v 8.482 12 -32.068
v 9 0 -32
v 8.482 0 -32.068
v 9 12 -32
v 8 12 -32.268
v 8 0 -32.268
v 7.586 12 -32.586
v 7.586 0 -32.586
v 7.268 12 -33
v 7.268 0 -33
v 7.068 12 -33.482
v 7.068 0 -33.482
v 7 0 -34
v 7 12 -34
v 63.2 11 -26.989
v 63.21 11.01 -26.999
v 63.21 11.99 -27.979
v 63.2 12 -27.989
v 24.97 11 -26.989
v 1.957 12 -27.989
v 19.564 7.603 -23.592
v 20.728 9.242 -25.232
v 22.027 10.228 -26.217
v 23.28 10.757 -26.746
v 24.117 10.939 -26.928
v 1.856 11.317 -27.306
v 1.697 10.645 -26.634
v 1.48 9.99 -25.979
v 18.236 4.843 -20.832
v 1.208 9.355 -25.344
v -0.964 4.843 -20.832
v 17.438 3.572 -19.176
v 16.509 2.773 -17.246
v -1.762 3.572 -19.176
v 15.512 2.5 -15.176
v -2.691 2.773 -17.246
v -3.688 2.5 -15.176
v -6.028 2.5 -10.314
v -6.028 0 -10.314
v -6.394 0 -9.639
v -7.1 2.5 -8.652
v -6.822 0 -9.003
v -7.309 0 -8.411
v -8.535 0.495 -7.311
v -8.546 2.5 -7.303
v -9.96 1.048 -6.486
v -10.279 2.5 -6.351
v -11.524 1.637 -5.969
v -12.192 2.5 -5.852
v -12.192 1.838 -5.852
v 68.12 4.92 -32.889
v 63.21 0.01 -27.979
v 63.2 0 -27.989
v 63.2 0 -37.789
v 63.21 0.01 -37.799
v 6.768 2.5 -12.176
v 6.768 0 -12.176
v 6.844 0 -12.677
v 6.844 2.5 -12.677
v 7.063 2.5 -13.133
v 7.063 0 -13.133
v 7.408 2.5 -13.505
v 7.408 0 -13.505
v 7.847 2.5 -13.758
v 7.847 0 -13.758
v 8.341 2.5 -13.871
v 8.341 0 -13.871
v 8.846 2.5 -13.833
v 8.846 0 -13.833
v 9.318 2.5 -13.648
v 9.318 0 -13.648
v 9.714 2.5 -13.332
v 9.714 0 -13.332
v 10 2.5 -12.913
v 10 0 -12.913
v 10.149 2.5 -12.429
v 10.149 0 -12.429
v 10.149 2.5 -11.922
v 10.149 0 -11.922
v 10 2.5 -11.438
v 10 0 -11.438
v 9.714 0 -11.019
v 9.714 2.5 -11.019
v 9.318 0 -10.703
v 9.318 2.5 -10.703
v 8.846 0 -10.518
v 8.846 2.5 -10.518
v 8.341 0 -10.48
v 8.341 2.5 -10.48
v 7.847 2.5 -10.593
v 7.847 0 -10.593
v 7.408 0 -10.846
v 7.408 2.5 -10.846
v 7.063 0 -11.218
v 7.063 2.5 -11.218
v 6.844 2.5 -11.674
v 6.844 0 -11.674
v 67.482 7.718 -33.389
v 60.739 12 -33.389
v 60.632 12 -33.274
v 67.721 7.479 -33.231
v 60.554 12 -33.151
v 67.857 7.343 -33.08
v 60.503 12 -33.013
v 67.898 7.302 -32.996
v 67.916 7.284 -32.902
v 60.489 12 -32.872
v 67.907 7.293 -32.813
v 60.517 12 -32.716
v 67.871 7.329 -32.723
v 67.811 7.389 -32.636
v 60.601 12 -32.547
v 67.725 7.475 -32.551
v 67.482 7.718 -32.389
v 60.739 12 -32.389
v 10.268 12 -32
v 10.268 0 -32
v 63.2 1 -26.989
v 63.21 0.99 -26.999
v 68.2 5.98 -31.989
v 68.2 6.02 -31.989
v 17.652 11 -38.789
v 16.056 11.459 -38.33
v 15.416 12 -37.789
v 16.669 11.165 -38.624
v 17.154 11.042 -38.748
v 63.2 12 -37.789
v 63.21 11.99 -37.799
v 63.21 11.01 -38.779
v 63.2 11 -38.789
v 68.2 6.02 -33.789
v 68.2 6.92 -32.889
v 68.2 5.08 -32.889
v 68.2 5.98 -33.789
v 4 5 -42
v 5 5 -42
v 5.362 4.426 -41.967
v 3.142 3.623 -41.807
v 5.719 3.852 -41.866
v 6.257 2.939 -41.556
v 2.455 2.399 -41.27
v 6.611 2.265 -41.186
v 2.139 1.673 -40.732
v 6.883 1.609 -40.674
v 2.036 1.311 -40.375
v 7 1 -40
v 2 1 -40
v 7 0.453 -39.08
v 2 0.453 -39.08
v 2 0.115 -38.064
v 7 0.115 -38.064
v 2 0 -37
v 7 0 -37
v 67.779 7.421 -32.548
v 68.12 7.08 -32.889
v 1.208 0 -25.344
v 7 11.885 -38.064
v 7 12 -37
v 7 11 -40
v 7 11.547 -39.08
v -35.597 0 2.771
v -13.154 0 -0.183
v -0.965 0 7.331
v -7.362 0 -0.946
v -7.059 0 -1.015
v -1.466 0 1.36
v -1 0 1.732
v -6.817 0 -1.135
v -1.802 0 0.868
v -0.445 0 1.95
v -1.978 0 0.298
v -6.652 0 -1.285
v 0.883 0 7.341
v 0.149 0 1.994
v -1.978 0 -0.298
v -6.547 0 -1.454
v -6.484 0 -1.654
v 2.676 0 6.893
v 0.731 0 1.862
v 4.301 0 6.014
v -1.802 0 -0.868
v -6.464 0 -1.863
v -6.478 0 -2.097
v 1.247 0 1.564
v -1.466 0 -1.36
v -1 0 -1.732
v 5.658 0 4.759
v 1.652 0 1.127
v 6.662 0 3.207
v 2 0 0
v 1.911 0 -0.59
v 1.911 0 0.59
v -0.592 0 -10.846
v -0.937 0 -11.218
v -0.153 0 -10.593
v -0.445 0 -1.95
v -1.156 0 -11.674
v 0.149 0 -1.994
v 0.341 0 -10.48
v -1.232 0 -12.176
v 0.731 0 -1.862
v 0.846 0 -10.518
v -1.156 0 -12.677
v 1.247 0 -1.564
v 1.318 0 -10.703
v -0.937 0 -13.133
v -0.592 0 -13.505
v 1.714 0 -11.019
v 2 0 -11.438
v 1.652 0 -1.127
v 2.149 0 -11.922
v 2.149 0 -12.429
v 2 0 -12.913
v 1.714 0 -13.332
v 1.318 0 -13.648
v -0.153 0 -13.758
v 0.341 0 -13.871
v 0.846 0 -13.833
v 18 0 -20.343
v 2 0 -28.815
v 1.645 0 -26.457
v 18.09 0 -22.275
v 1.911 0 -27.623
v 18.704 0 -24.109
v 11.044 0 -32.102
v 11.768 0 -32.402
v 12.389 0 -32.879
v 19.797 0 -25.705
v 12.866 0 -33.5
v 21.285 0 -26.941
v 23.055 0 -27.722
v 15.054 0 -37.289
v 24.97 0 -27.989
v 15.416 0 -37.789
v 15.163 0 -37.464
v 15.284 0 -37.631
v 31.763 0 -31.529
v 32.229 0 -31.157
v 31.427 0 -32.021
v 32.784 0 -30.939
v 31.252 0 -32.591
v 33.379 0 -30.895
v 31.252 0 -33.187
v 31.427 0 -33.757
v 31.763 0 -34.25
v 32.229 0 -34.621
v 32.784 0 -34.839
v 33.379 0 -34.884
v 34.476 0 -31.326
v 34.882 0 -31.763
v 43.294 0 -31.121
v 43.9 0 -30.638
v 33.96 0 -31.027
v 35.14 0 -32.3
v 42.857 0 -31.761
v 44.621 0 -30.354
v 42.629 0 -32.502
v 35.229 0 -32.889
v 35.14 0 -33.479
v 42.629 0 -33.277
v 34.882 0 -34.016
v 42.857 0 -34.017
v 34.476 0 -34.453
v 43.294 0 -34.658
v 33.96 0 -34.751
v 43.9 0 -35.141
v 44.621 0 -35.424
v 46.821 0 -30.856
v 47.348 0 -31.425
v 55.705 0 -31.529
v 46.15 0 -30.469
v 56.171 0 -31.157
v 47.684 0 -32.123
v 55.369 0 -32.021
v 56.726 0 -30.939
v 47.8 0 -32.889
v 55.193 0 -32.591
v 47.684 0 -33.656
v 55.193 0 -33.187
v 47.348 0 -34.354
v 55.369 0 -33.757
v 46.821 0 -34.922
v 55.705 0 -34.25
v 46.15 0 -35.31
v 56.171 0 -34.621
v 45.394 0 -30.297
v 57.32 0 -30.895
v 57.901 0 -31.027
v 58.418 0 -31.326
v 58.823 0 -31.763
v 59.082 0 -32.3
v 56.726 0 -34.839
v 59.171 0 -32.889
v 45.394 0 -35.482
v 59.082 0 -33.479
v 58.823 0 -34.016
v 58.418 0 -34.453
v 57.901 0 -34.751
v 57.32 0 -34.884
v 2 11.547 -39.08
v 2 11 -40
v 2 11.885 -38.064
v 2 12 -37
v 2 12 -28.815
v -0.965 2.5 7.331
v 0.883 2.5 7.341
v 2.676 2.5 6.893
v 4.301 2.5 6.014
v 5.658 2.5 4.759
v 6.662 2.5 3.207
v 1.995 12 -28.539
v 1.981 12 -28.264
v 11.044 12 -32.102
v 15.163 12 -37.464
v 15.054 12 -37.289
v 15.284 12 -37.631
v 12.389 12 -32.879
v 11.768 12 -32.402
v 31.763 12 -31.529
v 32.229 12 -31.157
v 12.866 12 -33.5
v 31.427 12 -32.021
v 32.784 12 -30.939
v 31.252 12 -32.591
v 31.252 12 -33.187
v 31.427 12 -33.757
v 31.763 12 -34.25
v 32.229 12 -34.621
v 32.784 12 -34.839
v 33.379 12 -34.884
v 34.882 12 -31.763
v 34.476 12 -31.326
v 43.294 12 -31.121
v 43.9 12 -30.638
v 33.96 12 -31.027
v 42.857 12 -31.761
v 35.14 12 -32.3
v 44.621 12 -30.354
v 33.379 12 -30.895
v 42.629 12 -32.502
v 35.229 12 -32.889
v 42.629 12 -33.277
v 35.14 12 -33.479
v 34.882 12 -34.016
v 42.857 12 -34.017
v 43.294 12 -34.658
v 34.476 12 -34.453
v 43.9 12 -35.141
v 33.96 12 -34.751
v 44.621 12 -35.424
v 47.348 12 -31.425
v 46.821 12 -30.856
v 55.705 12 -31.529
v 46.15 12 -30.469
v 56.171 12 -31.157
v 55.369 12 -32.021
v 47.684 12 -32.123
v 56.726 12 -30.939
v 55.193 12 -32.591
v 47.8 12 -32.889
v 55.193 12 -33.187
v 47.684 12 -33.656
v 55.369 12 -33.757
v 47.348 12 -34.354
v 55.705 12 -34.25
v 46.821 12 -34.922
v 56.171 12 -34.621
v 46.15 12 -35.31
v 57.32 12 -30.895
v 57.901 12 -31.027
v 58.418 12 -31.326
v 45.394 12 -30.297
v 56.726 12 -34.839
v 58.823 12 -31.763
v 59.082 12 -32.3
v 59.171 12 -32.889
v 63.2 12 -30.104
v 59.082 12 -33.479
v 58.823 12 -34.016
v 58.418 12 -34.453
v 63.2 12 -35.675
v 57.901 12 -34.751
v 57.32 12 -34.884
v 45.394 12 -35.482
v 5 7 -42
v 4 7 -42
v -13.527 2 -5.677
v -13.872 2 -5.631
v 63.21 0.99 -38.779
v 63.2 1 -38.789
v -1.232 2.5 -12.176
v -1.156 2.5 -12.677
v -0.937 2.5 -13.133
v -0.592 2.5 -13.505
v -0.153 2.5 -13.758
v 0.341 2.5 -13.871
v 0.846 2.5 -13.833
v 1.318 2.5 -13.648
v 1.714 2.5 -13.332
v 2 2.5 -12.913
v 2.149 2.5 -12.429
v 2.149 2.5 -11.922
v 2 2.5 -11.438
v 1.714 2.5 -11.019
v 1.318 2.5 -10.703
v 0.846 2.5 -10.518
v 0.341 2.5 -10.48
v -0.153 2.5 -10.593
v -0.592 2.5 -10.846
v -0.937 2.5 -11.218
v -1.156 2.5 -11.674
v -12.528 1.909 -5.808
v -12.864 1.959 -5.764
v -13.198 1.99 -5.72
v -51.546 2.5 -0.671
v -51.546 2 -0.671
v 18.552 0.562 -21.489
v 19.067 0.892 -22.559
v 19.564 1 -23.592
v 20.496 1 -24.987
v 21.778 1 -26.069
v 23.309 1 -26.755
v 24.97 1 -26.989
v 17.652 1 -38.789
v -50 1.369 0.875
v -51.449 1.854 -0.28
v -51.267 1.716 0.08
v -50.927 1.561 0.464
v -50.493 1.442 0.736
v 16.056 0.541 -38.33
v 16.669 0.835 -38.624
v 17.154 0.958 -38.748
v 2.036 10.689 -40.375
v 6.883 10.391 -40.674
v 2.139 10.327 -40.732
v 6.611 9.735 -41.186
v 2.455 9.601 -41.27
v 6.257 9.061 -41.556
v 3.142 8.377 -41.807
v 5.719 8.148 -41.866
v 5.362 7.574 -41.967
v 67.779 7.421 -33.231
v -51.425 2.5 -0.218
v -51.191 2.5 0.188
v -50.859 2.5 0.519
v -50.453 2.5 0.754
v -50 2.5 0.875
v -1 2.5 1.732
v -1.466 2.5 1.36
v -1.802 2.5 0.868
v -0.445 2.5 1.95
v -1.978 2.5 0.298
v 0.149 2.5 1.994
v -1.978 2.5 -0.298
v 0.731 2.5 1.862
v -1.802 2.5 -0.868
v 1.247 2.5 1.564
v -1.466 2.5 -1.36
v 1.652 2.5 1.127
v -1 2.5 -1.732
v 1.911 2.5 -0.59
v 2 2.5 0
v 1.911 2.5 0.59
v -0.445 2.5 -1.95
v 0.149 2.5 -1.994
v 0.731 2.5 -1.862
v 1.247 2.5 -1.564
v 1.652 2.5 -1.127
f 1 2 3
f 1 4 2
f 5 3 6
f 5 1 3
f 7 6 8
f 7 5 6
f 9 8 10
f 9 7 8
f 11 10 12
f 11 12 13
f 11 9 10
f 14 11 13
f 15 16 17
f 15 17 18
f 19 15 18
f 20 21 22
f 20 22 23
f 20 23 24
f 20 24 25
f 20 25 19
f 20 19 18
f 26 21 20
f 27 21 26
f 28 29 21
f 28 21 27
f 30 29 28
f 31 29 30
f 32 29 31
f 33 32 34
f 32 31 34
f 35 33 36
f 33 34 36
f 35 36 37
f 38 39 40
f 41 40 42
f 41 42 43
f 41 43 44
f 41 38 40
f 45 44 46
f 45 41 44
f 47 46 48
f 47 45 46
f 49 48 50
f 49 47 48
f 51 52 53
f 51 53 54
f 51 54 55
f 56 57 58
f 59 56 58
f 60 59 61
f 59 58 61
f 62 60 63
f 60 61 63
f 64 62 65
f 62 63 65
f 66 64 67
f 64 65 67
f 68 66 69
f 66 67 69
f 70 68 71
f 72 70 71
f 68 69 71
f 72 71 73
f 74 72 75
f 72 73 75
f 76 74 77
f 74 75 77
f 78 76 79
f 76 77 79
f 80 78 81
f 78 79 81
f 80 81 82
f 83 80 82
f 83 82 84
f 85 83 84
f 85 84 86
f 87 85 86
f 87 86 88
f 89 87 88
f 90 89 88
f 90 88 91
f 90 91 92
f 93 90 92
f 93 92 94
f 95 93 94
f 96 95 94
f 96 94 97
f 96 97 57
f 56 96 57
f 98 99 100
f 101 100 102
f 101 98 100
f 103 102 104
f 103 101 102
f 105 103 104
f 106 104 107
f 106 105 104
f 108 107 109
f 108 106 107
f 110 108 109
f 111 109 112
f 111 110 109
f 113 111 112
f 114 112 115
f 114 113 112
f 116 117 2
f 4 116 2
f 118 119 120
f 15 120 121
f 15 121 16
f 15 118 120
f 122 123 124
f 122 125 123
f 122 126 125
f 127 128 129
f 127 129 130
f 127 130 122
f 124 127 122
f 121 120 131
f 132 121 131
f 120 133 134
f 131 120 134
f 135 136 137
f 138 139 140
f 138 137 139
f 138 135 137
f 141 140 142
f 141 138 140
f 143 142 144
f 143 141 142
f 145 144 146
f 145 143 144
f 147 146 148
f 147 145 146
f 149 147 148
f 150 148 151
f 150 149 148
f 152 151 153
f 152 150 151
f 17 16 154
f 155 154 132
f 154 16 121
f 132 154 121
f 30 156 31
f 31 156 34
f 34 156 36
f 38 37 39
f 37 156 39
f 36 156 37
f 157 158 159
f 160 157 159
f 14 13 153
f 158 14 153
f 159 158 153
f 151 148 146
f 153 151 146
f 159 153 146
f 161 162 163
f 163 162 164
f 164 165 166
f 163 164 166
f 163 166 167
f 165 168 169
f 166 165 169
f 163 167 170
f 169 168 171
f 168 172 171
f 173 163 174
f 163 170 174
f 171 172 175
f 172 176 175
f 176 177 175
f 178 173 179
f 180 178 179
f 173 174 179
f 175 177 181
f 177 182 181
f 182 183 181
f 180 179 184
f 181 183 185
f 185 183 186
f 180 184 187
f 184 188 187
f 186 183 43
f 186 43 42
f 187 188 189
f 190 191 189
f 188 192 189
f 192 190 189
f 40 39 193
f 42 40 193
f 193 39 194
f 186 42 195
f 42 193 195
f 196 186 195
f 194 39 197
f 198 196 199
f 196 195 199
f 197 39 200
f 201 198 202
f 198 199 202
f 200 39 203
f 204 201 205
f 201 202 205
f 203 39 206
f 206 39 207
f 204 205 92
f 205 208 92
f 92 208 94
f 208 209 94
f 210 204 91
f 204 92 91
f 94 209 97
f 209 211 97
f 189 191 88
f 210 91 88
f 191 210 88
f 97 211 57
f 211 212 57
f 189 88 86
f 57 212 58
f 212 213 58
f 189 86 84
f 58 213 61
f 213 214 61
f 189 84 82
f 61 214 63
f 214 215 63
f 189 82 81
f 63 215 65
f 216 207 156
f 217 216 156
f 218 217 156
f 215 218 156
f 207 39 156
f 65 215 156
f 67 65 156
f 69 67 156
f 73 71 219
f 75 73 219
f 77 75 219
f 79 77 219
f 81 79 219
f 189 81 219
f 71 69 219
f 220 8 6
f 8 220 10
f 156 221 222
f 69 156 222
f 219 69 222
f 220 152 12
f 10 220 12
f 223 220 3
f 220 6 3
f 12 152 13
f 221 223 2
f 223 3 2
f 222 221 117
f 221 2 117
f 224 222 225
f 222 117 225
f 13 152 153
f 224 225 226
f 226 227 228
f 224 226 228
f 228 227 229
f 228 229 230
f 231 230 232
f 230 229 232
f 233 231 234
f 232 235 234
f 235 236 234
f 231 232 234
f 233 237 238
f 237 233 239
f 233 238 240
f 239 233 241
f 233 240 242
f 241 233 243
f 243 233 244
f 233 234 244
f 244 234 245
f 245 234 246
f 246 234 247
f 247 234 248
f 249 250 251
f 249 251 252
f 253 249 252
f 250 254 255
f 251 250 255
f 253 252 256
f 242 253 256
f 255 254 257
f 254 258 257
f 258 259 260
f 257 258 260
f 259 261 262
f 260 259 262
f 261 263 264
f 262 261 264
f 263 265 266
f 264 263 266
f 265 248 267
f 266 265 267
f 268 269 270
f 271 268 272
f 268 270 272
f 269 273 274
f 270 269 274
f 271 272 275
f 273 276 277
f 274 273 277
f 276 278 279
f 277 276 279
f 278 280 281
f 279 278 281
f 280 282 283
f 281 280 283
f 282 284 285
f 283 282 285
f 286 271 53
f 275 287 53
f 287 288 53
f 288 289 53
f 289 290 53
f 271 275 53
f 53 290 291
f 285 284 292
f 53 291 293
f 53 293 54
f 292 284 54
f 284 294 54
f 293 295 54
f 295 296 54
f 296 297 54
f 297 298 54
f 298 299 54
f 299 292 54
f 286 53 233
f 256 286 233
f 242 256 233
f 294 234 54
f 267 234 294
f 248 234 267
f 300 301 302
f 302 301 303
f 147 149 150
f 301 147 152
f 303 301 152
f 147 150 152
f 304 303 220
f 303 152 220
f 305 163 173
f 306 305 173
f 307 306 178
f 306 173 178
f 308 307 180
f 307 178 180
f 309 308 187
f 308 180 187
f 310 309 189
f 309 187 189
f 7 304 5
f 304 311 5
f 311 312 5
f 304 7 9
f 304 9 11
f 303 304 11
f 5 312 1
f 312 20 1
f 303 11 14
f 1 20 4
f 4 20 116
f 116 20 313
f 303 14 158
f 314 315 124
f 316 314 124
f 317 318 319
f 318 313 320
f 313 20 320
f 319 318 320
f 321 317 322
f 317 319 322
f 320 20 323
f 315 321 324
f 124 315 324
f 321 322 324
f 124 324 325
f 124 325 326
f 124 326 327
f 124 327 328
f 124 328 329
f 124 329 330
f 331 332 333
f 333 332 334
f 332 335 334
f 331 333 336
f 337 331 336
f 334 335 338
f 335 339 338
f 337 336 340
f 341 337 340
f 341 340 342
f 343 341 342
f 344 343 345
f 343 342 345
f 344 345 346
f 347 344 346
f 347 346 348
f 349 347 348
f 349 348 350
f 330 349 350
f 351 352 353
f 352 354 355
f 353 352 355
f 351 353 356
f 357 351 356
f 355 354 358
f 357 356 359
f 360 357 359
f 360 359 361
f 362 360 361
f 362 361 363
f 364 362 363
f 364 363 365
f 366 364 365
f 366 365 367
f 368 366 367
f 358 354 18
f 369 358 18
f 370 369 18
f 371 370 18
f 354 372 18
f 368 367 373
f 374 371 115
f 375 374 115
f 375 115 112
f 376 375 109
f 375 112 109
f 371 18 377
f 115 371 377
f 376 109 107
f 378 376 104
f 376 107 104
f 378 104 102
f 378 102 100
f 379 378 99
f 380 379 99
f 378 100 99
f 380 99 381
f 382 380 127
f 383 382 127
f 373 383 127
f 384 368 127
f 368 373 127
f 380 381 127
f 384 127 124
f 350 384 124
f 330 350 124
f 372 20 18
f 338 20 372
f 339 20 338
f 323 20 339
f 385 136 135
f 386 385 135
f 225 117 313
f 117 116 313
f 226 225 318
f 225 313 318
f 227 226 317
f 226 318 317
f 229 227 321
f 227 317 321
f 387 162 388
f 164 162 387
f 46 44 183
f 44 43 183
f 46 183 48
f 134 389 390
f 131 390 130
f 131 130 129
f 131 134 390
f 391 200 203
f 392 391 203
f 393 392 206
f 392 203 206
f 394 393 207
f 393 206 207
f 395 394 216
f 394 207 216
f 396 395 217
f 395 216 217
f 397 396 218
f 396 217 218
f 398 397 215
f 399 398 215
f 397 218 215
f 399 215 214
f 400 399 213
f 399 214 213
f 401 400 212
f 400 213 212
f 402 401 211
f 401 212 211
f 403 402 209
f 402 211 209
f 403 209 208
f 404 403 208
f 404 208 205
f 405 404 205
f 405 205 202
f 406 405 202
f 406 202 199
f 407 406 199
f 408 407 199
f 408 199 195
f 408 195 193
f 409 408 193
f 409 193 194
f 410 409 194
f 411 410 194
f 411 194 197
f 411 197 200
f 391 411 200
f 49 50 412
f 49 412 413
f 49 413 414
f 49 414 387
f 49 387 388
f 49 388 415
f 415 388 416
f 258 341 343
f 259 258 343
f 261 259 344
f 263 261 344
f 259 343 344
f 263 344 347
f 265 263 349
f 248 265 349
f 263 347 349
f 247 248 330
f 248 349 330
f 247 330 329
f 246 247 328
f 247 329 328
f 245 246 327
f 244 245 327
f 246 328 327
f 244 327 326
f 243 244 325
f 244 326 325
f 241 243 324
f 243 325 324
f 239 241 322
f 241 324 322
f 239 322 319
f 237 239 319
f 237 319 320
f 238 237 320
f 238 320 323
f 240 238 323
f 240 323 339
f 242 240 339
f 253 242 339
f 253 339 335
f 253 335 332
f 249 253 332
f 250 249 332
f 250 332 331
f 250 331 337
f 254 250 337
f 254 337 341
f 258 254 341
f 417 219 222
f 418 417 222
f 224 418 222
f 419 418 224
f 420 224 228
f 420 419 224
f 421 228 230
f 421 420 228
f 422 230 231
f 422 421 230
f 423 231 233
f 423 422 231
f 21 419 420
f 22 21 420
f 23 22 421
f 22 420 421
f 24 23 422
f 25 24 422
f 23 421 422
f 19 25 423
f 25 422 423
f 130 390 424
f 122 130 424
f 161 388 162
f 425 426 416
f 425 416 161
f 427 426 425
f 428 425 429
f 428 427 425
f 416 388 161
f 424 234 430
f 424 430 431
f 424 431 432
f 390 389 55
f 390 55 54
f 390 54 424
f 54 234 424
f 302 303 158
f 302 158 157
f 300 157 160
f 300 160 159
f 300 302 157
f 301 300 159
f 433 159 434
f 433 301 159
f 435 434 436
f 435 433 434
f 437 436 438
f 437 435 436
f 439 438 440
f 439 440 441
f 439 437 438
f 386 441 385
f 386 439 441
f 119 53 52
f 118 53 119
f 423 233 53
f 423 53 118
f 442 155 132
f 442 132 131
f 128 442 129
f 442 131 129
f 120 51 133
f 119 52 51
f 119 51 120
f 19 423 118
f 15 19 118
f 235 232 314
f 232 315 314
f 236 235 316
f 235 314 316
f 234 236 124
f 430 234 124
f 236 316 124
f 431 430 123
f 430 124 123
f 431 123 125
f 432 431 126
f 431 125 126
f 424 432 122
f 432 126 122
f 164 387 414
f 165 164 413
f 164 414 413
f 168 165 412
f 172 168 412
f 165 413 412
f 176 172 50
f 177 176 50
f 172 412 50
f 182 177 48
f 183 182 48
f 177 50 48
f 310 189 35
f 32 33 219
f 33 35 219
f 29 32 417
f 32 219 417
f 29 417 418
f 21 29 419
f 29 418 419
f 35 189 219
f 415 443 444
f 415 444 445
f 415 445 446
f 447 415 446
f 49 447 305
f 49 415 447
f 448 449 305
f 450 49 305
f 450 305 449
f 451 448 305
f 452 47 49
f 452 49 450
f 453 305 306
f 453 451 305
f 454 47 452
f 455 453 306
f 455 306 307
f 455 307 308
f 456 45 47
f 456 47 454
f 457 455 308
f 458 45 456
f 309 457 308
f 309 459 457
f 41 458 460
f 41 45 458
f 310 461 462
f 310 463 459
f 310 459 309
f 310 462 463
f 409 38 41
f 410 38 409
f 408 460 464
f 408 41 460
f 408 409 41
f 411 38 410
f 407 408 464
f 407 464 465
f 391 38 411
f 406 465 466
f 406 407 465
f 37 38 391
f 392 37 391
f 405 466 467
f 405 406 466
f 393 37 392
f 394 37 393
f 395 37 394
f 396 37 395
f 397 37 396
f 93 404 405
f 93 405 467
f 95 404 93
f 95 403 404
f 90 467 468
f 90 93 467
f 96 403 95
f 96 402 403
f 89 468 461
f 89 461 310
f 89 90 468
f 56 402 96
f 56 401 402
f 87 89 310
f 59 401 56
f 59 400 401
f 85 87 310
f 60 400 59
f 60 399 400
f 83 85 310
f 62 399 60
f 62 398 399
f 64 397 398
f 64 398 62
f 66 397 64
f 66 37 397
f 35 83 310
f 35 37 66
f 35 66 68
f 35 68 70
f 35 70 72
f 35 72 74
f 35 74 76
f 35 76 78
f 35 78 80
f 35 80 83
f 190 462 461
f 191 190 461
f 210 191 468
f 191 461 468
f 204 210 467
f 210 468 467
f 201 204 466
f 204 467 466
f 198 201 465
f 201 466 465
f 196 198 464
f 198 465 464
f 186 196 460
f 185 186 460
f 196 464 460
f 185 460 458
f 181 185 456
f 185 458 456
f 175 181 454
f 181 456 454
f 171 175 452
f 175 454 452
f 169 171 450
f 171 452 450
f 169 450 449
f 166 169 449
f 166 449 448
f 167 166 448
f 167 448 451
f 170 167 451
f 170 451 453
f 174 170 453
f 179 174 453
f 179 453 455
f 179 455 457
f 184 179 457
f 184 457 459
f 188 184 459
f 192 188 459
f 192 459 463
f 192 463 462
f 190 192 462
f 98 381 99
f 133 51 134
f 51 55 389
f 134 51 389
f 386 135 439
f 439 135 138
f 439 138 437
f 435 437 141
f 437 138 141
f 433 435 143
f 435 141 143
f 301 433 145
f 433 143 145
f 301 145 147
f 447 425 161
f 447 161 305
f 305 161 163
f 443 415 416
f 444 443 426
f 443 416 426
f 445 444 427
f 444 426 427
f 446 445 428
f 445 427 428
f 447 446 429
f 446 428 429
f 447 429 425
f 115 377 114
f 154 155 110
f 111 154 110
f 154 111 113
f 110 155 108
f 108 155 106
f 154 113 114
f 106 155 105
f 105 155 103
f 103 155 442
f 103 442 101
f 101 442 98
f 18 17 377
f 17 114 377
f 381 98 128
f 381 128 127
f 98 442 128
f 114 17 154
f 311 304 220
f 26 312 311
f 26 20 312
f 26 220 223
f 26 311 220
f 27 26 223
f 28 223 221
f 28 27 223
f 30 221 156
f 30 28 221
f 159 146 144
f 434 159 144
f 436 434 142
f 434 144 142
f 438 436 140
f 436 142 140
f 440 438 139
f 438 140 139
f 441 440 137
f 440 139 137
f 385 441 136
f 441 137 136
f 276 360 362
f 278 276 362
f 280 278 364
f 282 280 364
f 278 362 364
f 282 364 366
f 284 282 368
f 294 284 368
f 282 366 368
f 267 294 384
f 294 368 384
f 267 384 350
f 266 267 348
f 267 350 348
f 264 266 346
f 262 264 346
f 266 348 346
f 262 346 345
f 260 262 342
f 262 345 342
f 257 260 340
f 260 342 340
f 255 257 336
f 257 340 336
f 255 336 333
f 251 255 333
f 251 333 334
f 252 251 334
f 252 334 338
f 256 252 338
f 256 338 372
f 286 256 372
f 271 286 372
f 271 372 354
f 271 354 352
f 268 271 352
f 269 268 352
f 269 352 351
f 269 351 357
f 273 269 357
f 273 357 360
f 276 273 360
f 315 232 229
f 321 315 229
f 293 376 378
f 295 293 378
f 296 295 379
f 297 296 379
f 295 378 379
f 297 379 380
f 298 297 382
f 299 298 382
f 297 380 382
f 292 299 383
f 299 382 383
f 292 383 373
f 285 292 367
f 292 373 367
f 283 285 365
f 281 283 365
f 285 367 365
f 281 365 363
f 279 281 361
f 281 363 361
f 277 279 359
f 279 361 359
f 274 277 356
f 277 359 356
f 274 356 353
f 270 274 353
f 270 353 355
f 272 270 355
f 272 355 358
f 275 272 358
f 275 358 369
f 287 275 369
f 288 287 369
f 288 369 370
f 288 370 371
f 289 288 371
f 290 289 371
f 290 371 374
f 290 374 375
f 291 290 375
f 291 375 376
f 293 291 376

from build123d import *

# Parameters (mm, degrees)
BOSS_EXTRUDE1_DEPTH          = 2.5
BOSS_EXTRUDE2_DEPTH          = 12
F_4_0_4_DIAMETER_HOLE1_D     = 4
F_4_0_4_DIAMETER_HOLE2_D     = 4
F_5_2_5_2_DIAMETER_HOLE1_D   = 5.2
CHAMFER5_SIZE                = 8.5
FILLET13_R                   = 6
CHAMFER1_SIZE                = 5
CHAMFER2_SIZE                = 1
CHAMFER4_SIZE                = 0.8
CUT_REVOLVE1_ANGLE           = 60
CUT_REVOLVE1_OTHER_WAY_ANGLE = 60
FILLET4_R                    = 1
FILLET5_R                    = 8
FILLET6_R                    = 3
FILLET7_R                    = 2
FILLET11_R                   = 5
FILLET12_R                   = 2
CUT_EXTRUDE2_DEPTH           = 38
CHAMFER8_SIZE                = 6.868693549
CHAMFER8_SIZE_2              = 2.5
FILLET14_R                   = 3
M3_CLEARANCE_HOLE1_D         = 3.4


with BuildPart() as part:
    # Sketch1 → Boss-Extrude1 (new body)
    with BuildSketch(Plane(origin=(0, 0, 0), x_dir=(1, 0, 0), z_dir=(0, 1, 0))):
        with BuildLine():
            Line((-7.904447763, 6.416984589), (-51.546411114, 0.671411114))
            ThreePointArc((-51.546411114, 0.671411114), (-51.035673477, -0.364262362), (-50, -0.875))
            Line((-50, -0.875), (-0.965087675, -7.330568677))
            ThreePointArc((-0.965087675, -7.330568677), (3.516208172, -6.504222585), (6.661937904, -3.207368814))
            Line((6.661937904, -3.207368814), (21.2, 26.989241728))
            Line((21.2, 26.989241728), (2, 26.989241728))
            Line((2, 26.989241728), (-7.904447763, 6.416984589))
        make_face()
    extrude(amount=BOSS_EXTRUDE1_DEPTH)

    # Sketch1<6> → Boss-Extrude2 (add)
    with BuildSketch(Plane(origin=(0, 0, 0), x_dir=(1, 0, 0), z_dir=(0, 1, 0))):
        Polygon((2, 42), (2, 26.989241728), (68.2, 26.989241728), (68.2, 38.789241728), (15.919770539, 38.789241728), (12, 32), (7, 32), (7, 42), align=None)
    extrude(amount=BOSS_EXTRUDE2_DEPTH)

    # Ø4.0 (4) Diameter Hole1 (through all)
    with Locations(Plane(origin=(0, 0, 0), x_dir=(-1, 0, 0), z_dir=(0, -1, 0))):
        with Locations((-57.170705016, 32.889241728), (-33.229294984, 32.889241728)):
            Hole(F_4_0_4_DIAMETER_HOLE1_D / 2)

    # Ø4.0 (4) Diameter Hole2 (through all)
    with Locations(Plane(origin=(0, 0, 0), x_dir=(-1, 0, 0), z_dir=(0, -1, 0))):
        with Locations((0, 0)):
            Hole(F_4_0_4_DIAMETER_HOLE2_D / 2)

    # Ø5.2 (5.2) Diameter Hole1 (through all)
    with Locations(Plane(origin=(0, 0, 0), x_dir=(-1, 0, 0), z_dir=(0, -1, 0))):
        with Locations((-45.2, 32.889241728)):
            Hole(F_5_2_5_2_DIAMETER_HOLE1_D / 2)

    # Chamfer5
    chamfer5_edges = [part.edges().sort_by_distance(p)[0] for p in [
        (11.6, 2.5, -26.989241728),
    ]]
    chamfer(chamfer5_edges, length=CHAMFER5_SIZE)

    # Fillet13
    fillet13_edges = [part.edges().sort_by_distance(p)[0] for p in [
        (21.2, 5.5, -26.989241728),
    ]]
    fillet(fillet13_edges, radius=FILLET13_R)

    # Chamfer1
    chamfer1_edges = [part.edges().sort_by_distance(p)[0] for p in [
        (68.2, 0, -32.889241728),
        (68.2, 6, -26.989241728),
        (68.2, 6, -38.789241728),
        (68.2, 12, -32.889241728),
    ]]
    chamfer(chamfer1_edges, length=CHAMFER1_SIZE)

    # Chamfer2
    # the kernel refuses this chamfer: 1 mm, written as the material it takes off along each edge
    with BuildSketch(Plane(origin=(24.970484005, 0, -26.989241728), x_dir=(0, 0, -1), z_dir=(1, 0, 0))) as chamfer2_piece_1:
        Polygon((CHAMFER2_SIZE, 0), (0, CHAMFER2_SIZE), (0, 0), align=None)
    extrude(amount=40.801198983, mode=Mode.SUBTRACT)
    with BuildSketch(Plane(origin=(-0.571682988, 12, -26.989241728), x_dir=(0, -1, 0), z_dir=(1, 0, 0))) as chamfer2_piece_2:
        Polygon((CHAMFER2_SIZE, 0), (0, CHAMFER2_SIZE), (0, 0), align=None)
    extrude(amount=66.343365976, mode=Mode.SUBTRACT)
    with BuildSketch(Plane(origin=(65.771682988, 12, -38.789241728), x_dir=(0, -1, 0), z_dir=(-1, 0, 0)), Plane(origin=(65.771682988, 0, -38.789241728), x_dir=(0, 0, 1), z_dir=(-1, 0, 0))) as chamfer2_piece_3:
        Polygon((CHAMFER2_SIZE, 0), (0, CHAMFER2_SIZE), (0, 0), align=None)
    extrude(amount=52.423595437, mode=Mode.SUBTRACT)
    with BuildSketch(Plane(origin=(24.970484005, 0, -20.989241728), x_dir=(-0.9610284466527214, -1.1097335043339142e-15, 0.27644949760174536), z_dir=(0.27644949760174536, 0, 0.9610284466527214))) as chamfer2_piece_4:
        Polygon((6 + CHAMFER2_SIZE, 0), (6, -CHAMFER2_SIZE), (6, 0), align=None)
    revolve(axis=Axis((24.970484005, 0, -20.989241728), (0, -1, 0)), revolution_arc=106.048413393, mode=Mode.SUBTRACT)

    # Chamfer4
    # the kernel refuses this chamfer: 0.8 mm, written as the material it takes off along each edge
    with BuildSketch(Plane(origin=(62.505076275, -0.694923725, -39.484165453), x_dir=(-0.40824829046386635, -0.4082482904638597, 0.816496580927726), z_dir=(0.5773502691896258, 0.5773502691896258, 0.5773502691896258)), Plane(origin=(62.505076275, 12.694923725, -39.484165453), x_dir=(-0.40824829046386746, -0.816496580927726, -0.4082482904638586), z_dir=(0.5773502691896258, -0.5773502691896258, 0.5773502691896258)), Plane(origin=(69.394923725, 5.805076275, -33.184165453), x_dir=(-0.408248290463863, -0.816496580927726, 0.408248290463863), z_dir=(-0.5773502691896258, 0.5773502691896258, 0.5773502691896258))) as chamfer4_piece_1:
        Polygon((CHAMFER4_SIZE, 0), (-CHAMFER4_SIZE * 0.5, -CHAMFER4_SIZE * 0.866025403784), (0, 0), align=None)
    extrude(amount=11.933565841, mode=Mode.SUBTRACT)
    with BuildSketch(Plane(origin=(62.505076275, -0.694923725, -26.294318002), x_dir=(-0.4082482904638641, -0.4082482904638619, -0.816496580927726), z_dir=(0.5773502691896258, 0.5773502691896258, -0.5773502691896258))) as chamfer4_piece_2:
        Polygon((CHAMFER4_SIZE, 0), (-CHAMFER4_SIZE * 0.5, CHAMFER4_SIZE * 0.866025403784), (0, 0), align=None)
    extrude(amount=11.933565841, mode=Mode.SUBTRACT)

    # Sketch7 → Cut-Revolve1 (revolve, cut)
    with BuildSketch(Plane.XY.offset(-32.889241728)):
        Polygon((68.2, 6.920204103), (60.2, 12), (60.2, 14), (68.2, 14), align=None)
    revolve(axis=Axis((68.2, 6.920204103, -32.889241728), (-0.8441922430161829, 0.5360405365560577, 0)), revolution_arc=CUT_REVOLVE1_ANGLE, mode=Mode.SUBTRACT)

    # Sketch7 → Cut-Revolve1 other way (revolve, cut)
    with BuildSketch(Plane.XY.offset(-32.889241728)):
        Polygon((68.2, 6.920204103), (60.2, 12), (60.2, 14), (68.2, 14), align=None)
    revolve(axis=Axis((68.2, 6.920204103, -32.889241728), (0.8441922430161829, -0.5360405365560577, 0)), revolution_arc=CUT_REVOLVE1_OTHER_WAY_ANGLE, mode=Mode.SUBTRACT)

    # Fillet4
    # the kernel refuses this fillet: 1 mm, written as the material it adds along each edge
    with BuildSketch(Plane(origin=(69.418486547, 6.146496233, -32.889241728), x_dir=(0.26802026827802927, 0.42209612150809256, -0.8660254037844378), z_dir=(-0.8441922430161831, 0.5360405365560573, 0))) as fillet4_piece_1_section:
        with BuildLine():
            CenterArc((FILLET4_R * 0.57735026919, -FILLET4_R), FILLET4_R, 90, 60)
            Line((-FILLET4_R * 0.288675134595, -FILLET4_R * 0.5), (0, 0))
            Line((0, 0), (FILLET4_R * 0.57735026919, 0))
        make_face()
    fillet4_piece_1 = extrude(amount=12.363265808, mode=Mode.PRIVATE)
    fillet4_piece_1 = split(fillet4_piece_1, bisect_by=Plane(origin=(69.418486547, 12, -32.889241728), z_dir=(0, -1, 0)), keep=Keep.TOP, mode=Mode.PRIVATE)
    fillet4_piece_1 = split(fillet4_piece_1, bisect_by=Plane(origin=(68.864064806, 5.869285362, -33.166452598), z_dir=(-0.8164965809277263, -0.4082482904637079, -0.4082482904640183)), keep=Keep.TOP, mode=Mode.PRIVATE)
    fillet4_piece_1 = split(fillet4_piece_1, bisect_by=Plane(origin=(69.235995157, 5.964004843, -32.889241728), z_dir=(-0.7071067811865476, -0.7071067811865476, 0)), keep=Keep.TOP, mode=Mode.PRIVATE)
    fillet4_piece_1 = split(fillet4_piece_1, bisect_by=Plane(origin=(68.864064806, 5.869285362, -32.612030857), z_dir=(-0.8164965809277263, -0.4082482904637079, 0.4082482904640183)), keep=Keep.TOP, mode=Mode.PRIVATE)
    add(fillet4_piece_1)

    # Fillet5
    fillet5_edges = [part.edges().sort_by_distance(p)[0] for p in [
        (7.507702037, 2.5, -18.489241728),
        (-7.904447763, 1.25, -6.416984589),
        (2, 5.5, -26.989241728),
    ]]
    fillet(fillet5_edges, radius=FILLET5_R)

    # Fillet6
    fillet6_edges = [part.edges().sort_by_distance(p)[0] for p in [
        (15.919770539, 6, -38.789241728),
        (12, 6, -32),
    ]]
    fillet(fillet6_edges, radius=FILLET6_R)

    # Fillet7
    fillet7_edges = [part.edges().sort_by_distance(p)[0] for p in [
        (7, 6, -32),
    ]]
    fillet(fillet7_edges, radius=FILLET7_R)

    # Fillet11
    fillet11_edges = [part.edges().sort_by_distance(p)[0] for p in [
        (4.5, 0, -42),
        (4.5, 12, -42),
    ]]
    fillet(fillet11_edges, radius=FILLET11_R)

    # Fillet12
    # the kernel refuses this fillet: 2 mm, written as the material it takes off along each edge
    with BuildSketch(Plane(origin=(2, 0, -42), x_dir=(0, 0, 1), z_dir=(0, 1, 0))) as fillet12_piece_1:
        with BuildLine():
            CenterArc((FILLET12_R, FILLET12_R), FILLET12_R, 180, 90)
            Line((0, FILLET12_R), (0, 0))
            Line((0, 0), (FILLET12_R, 0))
        make_face()
    extrude(amount=12, mode=Mode.SUBTRACT)
    with BuildSketch(Plane(origin=(7, 0, -42), x_dir=(0, 0, 1), z_dir=(0, 1, 0))) as fillet12_piece_2:
        with BuildLine():
            CenterArc((FILLET12_R, -FILLET12_R), FILLET12_R, 90, 90)
            Line((0, -FILLET12_R), (0, 0))
            Line((0, 0), (FILLET12_R, 0))
        make_face()
    extrude(amount=12, mode=Mode.SUBTRACT)

    # Sketch11 → Cut-Extrude2 (cut)
    with BuildSketch(Plane(origin=(-50.581323439, 0, 6.659157562), x_dir=(0, -1, 0), z_dir=(0.9914448613738103, 0, -0.1305261922200527))):
        Polygon((-2, 7.393823865), (0, 1.898869026), (0, 7.393823865), align=None)
    extrude(amount=CUT_EXTRUDE2_DEPTH, mode=Mode.SUBTRACT)

    # Chamfer8
    # the kernel refuses this chamfer: 6.868693549, 2.5 mm, written as the material it takes off along each edge
    with BuildSketch(Plane(origin=(-10.828460053, 0, 17.48282525), x_dir=(0.9914448613738103, 0, -0.1305261922200527), z_dir=(-0.1305261922200527, 0, -0.9914448613738103))) as chamfer8_piece_1_section:
        Polygon((CHAMFER8_SIZE, 0), (0, -CHAMFER8_SIZE_2), (0, 0), align=None)
    chamfer8_piece_1 = extrude(amount=41.132412086, mode=Mode.PRIVATE)
    chamfer8_piece_1 = split(chamfer8_piece_1, bisect_by=Plane(origin=(-11.100528233, -5.72682899, 15.416262251), z_dir=(-0.04464258697085675, -0.939692620785907, -0.3390941135865724)), keep=Keep.TOP, mode=Mode.PRIVATE)
    add(chamfer8_piece_1, mode=Mode.SUBTRACT)

    # Fillet14
    fillet14_edges = [part.edges().sort_by_distance(p)[0] for p in [
        (-9.426930062, 1, -3.445360698),
    ]]
    fillet(fillet14_edges, radius=FILLET14_R)

    # M3 Clearance Hole1 (through all)
    with Locations(Plane(origin=(0, 2.5, 0), x_dir=(1, 0, 0), z_dir=(0, 1, 0))):
        with Locations((0.467987162, 12.175533229), (8.467987162, 12.175533229)):
            Hole(M3_CLEARANCE_HOLE1_D / 2)


solid = part.part
